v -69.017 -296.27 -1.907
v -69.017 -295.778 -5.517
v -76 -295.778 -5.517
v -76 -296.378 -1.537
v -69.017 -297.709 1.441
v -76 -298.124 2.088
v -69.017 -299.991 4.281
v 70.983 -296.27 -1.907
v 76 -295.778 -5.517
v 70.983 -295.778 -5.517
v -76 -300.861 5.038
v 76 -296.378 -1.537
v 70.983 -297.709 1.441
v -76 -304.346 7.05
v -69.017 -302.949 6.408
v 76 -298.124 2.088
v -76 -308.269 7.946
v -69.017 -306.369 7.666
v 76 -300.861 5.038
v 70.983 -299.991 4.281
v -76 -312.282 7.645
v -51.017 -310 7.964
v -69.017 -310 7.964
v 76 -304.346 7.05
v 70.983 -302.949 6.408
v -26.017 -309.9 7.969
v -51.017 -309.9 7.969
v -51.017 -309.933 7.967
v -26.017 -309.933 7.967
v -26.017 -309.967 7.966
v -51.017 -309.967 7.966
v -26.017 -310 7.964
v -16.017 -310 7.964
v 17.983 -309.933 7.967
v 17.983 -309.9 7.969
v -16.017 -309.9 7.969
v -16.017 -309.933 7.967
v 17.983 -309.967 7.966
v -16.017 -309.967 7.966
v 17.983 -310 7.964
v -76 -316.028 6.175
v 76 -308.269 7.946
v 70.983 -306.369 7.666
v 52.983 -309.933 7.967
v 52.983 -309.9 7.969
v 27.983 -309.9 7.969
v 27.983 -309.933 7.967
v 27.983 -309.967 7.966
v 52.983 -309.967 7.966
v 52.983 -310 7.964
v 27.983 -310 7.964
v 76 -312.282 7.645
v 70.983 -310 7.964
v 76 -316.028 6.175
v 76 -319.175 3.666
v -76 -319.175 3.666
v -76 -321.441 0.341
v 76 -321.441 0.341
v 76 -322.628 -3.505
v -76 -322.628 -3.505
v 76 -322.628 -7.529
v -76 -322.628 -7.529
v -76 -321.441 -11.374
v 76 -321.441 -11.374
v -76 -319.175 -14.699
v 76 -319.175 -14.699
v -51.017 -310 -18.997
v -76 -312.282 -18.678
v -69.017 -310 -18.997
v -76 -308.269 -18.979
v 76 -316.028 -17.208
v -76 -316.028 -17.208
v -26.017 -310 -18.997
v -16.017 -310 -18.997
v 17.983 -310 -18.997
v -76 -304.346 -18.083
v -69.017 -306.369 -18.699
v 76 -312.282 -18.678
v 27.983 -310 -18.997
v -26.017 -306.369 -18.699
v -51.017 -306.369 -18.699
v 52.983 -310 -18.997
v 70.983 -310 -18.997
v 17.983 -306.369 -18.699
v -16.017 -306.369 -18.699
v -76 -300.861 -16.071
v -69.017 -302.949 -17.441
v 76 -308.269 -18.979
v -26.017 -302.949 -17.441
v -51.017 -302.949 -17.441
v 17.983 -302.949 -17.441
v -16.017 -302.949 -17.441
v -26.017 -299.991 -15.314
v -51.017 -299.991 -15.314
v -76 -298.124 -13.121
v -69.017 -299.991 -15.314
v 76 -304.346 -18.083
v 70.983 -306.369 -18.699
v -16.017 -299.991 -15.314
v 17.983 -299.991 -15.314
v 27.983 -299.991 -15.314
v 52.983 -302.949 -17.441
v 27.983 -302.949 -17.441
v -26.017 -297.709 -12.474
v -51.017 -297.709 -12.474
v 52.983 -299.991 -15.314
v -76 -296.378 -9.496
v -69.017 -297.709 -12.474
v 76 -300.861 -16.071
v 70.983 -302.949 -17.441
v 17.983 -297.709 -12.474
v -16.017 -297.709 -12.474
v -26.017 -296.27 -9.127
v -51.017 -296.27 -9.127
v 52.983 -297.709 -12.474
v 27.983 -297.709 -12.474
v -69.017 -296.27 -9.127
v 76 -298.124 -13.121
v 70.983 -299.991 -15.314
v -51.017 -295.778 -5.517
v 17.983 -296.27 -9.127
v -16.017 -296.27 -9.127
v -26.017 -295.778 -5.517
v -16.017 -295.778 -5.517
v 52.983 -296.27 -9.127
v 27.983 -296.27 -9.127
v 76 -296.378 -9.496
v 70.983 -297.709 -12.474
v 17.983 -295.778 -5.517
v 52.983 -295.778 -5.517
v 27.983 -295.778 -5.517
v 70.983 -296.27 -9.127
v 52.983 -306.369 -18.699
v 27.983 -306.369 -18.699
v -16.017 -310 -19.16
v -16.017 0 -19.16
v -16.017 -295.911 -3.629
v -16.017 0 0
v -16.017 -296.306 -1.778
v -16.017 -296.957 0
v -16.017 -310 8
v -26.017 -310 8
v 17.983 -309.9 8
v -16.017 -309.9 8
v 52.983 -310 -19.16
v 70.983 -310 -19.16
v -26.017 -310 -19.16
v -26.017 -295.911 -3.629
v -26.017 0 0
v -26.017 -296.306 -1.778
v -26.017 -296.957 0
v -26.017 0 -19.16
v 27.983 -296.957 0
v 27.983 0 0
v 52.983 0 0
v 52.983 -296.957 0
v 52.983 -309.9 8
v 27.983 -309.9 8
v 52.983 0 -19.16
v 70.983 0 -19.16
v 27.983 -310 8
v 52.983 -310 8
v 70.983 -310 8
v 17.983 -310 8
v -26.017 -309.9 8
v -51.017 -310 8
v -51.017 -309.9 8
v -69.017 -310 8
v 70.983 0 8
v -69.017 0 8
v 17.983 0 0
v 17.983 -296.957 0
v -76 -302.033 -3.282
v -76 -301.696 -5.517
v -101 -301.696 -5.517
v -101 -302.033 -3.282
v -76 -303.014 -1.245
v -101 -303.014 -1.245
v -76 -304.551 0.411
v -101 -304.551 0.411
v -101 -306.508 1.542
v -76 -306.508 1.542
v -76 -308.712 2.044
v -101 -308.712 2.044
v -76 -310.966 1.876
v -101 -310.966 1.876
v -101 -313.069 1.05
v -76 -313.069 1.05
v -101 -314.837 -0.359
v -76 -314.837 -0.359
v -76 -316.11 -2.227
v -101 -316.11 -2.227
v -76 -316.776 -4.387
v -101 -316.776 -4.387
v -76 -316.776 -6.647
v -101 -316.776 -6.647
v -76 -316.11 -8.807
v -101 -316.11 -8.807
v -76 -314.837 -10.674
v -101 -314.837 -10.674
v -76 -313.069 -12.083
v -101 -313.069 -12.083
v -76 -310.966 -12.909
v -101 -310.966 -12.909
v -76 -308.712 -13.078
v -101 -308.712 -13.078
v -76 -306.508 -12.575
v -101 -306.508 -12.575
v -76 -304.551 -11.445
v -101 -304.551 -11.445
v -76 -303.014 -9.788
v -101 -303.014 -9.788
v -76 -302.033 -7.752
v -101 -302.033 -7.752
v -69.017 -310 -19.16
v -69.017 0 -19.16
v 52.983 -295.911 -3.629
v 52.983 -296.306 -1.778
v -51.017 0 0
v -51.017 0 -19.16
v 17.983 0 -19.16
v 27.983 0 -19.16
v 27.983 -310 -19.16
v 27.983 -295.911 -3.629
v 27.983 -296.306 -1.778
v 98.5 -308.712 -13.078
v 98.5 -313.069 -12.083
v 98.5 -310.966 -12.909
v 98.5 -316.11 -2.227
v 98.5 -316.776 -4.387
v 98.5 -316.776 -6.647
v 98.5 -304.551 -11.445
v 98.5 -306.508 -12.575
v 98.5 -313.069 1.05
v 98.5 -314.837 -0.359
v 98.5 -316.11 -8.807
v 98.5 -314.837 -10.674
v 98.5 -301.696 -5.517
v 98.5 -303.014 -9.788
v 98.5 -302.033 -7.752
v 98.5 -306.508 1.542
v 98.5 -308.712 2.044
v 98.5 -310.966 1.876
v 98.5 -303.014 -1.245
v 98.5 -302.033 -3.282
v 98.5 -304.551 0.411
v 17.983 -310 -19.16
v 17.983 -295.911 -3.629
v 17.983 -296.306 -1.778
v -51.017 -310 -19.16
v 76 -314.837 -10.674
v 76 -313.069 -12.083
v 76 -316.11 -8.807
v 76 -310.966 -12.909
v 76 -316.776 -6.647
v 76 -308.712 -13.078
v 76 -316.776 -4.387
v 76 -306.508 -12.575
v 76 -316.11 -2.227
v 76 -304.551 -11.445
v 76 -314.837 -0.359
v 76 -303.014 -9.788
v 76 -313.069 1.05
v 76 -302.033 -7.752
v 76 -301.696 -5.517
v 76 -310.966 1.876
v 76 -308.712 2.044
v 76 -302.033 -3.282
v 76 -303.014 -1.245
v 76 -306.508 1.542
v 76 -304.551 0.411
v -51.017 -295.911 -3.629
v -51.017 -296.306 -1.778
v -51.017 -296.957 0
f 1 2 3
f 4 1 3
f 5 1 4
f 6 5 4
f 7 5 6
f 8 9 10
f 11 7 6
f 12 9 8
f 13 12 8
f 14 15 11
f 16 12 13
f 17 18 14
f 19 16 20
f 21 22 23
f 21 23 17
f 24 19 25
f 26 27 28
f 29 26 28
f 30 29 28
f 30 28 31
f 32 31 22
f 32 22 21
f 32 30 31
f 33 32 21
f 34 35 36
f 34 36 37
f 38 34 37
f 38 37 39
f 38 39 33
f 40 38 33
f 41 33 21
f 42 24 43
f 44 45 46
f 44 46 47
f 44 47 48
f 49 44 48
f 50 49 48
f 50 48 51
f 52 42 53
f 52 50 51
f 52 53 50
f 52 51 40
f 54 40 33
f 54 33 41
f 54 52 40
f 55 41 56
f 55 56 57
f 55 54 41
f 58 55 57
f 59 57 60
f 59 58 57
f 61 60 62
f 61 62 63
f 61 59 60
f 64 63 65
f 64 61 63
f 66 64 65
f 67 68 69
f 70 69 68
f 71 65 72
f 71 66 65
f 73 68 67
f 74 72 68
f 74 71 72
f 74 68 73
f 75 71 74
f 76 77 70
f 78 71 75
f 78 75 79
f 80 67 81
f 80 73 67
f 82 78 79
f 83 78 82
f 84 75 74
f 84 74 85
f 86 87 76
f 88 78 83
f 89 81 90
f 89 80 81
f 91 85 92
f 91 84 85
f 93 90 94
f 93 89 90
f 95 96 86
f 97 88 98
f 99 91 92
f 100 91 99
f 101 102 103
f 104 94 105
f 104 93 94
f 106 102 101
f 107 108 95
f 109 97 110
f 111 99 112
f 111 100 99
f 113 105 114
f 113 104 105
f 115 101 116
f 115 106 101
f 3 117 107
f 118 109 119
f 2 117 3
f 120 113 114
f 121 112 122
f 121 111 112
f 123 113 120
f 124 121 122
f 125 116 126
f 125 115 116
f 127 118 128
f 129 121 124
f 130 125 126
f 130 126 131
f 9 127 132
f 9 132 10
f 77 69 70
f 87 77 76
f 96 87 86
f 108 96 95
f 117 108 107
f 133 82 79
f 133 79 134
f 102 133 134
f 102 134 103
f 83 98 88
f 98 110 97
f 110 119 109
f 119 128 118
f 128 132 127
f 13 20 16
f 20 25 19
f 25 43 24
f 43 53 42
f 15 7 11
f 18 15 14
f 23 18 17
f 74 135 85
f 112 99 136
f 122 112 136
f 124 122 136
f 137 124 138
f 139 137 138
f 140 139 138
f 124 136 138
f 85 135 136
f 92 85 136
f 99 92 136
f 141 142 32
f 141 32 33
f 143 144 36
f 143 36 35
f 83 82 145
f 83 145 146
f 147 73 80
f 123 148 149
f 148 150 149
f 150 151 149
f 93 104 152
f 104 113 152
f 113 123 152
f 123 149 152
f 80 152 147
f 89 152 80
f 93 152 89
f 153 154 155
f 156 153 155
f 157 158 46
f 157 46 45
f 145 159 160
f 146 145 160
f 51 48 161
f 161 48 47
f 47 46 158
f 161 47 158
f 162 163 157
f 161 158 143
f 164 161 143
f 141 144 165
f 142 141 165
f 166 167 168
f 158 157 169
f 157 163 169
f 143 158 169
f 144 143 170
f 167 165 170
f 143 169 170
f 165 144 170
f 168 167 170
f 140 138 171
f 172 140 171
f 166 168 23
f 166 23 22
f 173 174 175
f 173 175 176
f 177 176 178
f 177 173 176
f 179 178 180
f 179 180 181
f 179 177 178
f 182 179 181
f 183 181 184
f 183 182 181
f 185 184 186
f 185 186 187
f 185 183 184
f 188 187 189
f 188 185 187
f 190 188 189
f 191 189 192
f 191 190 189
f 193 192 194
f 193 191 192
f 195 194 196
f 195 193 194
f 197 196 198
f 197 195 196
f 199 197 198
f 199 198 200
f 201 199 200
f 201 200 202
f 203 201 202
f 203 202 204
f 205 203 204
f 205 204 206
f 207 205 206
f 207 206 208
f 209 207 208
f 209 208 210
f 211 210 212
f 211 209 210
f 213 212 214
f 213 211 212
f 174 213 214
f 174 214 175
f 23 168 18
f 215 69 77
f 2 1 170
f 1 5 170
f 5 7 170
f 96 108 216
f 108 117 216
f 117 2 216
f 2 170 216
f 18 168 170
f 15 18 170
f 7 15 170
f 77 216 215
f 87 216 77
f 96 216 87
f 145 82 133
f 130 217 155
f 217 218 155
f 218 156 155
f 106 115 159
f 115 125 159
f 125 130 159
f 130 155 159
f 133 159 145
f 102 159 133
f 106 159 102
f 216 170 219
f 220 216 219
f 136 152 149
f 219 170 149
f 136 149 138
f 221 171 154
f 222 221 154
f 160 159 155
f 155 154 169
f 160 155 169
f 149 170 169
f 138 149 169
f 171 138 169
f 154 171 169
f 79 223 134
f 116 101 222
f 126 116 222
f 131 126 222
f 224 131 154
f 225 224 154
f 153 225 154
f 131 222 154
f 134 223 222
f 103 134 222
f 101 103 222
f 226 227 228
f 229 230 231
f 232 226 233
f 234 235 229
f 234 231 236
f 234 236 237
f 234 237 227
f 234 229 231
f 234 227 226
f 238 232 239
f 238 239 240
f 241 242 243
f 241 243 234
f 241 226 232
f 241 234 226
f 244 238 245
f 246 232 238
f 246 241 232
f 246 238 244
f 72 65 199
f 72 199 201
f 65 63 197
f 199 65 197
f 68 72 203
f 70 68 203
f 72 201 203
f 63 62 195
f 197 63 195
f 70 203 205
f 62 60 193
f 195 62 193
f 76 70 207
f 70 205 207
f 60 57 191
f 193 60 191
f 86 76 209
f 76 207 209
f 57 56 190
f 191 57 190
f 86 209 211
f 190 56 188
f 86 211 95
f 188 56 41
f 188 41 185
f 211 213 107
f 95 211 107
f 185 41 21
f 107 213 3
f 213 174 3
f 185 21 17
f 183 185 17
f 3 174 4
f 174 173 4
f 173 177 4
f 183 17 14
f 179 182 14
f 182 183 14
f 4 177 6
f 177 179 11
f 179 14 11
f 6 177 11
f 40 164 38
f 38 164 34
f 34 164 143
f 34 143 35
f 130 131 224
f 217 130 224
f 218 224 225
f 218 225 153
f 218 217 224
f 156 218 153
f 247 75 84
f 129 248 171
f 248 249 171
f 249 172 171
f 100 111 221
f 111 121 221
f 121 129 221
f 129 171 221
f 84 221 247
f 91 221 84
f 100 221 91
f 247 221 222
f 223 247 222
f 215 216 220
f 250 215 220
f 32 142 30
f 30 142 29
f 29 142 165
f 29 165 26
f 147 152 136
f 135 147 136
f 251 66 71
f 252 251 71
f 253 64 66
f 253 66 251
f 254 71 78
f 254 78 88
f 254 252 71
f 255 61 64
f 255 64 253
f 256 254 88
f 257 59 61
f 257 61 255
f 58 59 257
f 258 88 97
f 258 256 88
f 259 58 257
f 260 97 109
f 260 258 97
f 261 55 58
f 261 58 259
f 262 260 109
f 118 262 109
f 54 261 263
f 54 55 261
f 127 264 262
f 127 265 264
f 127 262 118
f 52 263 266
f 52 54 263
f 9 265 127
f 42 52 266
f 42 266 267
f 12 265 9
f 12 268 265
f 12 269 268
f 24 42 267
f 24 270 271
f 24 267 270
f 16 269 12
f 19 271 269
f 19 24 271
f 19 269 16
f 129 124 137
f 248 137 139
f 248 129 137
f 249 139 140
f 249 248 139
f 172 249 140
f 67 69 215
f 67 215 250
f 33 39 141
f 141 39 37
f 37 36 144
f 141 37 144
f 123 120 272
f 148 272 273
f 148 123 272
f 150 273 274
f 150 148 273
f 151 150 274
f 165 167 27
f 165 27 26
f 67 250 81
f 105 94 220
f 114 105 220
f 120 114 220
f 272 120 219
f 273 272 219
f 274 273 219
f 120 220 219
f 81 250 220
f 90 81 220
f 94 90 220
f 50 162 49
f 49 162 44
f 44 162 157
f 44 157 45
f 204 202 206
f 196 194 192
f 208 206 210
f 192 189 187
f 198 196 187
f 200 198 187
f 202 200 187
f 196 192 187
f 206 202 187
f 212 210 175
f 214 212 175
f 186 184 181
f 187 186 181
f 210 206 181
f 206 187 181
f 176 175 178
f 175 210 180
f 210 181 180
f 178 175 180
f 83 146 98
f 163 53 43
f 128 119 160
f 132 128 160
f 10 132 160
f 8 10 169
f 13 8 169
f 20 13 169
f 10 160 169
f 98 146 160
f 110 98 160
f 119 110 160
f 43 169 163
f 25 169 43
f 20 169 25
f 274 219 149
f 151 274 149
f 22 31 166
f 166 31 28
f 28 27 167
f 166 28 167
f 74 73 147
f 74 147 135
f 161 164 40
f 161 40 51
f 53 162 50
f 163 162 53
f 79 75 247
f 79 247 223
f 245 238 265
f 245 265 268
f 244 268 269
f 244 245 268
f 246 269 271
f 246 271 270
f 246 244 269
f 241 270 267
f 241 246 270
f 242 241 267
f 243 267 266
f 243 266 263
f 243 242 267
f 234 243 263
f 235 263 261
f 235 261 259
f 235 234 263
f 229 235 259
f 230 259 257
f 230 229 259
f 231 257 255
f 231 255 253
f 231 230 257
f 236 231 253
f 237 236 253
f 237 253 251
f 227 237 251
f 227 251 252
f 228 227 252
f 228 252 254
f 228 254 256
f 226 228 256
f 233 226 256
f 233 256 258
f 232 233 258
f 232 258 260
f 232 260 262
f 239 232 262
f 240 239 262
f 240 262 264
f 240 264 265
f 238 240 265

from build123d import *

# Parameters (mm, degrees)
F1_DEPTH  = 310
F0_W      = 34
F0_H      = 8
F2_DEPTH  = 250
F3_DEPTH  = 310
F0_W_2    = 25
F4_DEPTH  = 309.9
F5_R      = 13.5
F6_DEPTH  = 76
F7_R      = 7.5823100612
F8_DEPTH  = 325
F9_DEPTH  = 177
F10_DEPTH = 162.7
F11_DEPTH = 154.5


with BuildPart() as f1:
    # F0 (on Front) → F1 (new body)
    with BuildSketch(Plane.XZ):
        Polygon((70.9833226877, 8), (52.9833226877, 8), (52.9833226877, 0), (52.9833226877, -19.1598301306), (70.9833226877, -19.1598301306), (70.9833226877, 3.8401698694), align=None)
    extrude(amount=F1_DEPTH)



with BuildPart() as f1b:
    # F0 (on Front) → F1, piece 2 (new body)
    with BuildSketch(Plane.XZ):
        Polygon((-69.0166773123, -19.1598301306), (-51.0166773123, -19.1598301306), (-51.0166773123, 0), (-51.0166773123, 8), (-69.0166773123, 8), (-69.0166773123, 3.8401698694), align=None)
    extrude(amount=F1_DEPTH)


with BuildPart() as f2:
    # F0 (on Front) → F2 (new body)
    with BuildSketch(Plane.XZ):
        with Locations((0.9833226877, 4)):
            Rectangle(F0_W, F0_H)
    extrude(amount=F2_DEPTH)

    # F0 (on Front) → F3 (join)
    with BuildSketch(Plane.XZ):
        Polygon((-26.0166773123, 8), (-26.0166773123, 0), (-26.0166773123, -19.1598301306), (-16.0166773123, -19.1598301306), (-16.0166773123, 0), (-16.0166773123, 8), align=None)
        Polygon((27.9833226877, 8), (17.9833226877, 8), (17.9833226877, 0), (17.9833226877, -19.1598301306), (27.9833226877, -19.1598301306), (27.9833226877, 0), align=None)
    extrude(amount=F3_DEPTH)


with BuildPart() as f4:
    # F0 (on Front) → F4 (new body)
    with BuildSketch(Plane.XZ):
        with Locations((-38.5166773123, 4)):
            Rectangle(F0_W_2, F0_H)
    extrude(amount=F4_DEPTH)


with BuildPart() as f4b:
    # F0 (on Front) → F4, piece 2 (new body)
    with BuildSketch(Plane.XZ):
        with Locations((40.4833226877, 4)):
            Rectangle(F0_W_2, F0_H)
    extrude(amount=F4_DEPTH)


with BuildPart() as f4c:
    # F0 (on Front) → F4, piece 3 (new body)
    with BuildSketch(Plane.XZ):
        with Locations((0.9833226877, 4)):
            Rectangle(F0_W, F0_H)
    extrude(amount=F4_DEPTH)


with BuildPart() as f1_1:
    add(f1.part)

    add(f1b.part)  # F6 merges F1b

    add(f2.part)  # F6 merges F2

    add(f4.part)  # F6 merges F4

    add(f4b.part)  # F6 merges F4b

    add(f4c.part)  # F6 merges F4c
    # F5 (on Right) → F6 (join, symmetric)
    with BuildSketch(Plane.YZ):
        with Locations((-309.2783357923, -5.516671653)):
            Circle(F5_R)
    extrude(amount=F6_DEPTH, both=True)

    # F7 (on face) → F8 (cut)
    with BuildSketch(Plane.YZ.offset(76)):
        with Locations((-309.2783357923, -5.516671653)):
            Circle(F7_R)
    extrude(amount=-F8_DEPTH, mode=Mode.SUBTRACT)

    # F7 (on face) → F9 (join, symmetric)
    with BuildSketch(Plane.YZ.offset(76)):
        with Locations((-309.2783357923, -5.516671653)):
            Circle(F7_R)
    extrude(amount=F9_DEPTH, both=True)

    # F10 (add): a face of the model
    f10_faces = [f1_1.faces().sort_by_distance(p)[0] for p in [
        (253, -309.2783357923, -5.516671653),
    ]]
    extrude(f10_faces, amount=-F10_DEPTH)

    # F11 (cut): a face of the model
    f11_faces = [f1_1.faces().sort_by_distance(p)[0] for p in [
        (253, -309.2783357923, -5.516671653),
    ]]
    extrude(f11_faces, amount=-F11_DEPTH, mode=Mode.SUBTRACT)


solid = f1_1.part
